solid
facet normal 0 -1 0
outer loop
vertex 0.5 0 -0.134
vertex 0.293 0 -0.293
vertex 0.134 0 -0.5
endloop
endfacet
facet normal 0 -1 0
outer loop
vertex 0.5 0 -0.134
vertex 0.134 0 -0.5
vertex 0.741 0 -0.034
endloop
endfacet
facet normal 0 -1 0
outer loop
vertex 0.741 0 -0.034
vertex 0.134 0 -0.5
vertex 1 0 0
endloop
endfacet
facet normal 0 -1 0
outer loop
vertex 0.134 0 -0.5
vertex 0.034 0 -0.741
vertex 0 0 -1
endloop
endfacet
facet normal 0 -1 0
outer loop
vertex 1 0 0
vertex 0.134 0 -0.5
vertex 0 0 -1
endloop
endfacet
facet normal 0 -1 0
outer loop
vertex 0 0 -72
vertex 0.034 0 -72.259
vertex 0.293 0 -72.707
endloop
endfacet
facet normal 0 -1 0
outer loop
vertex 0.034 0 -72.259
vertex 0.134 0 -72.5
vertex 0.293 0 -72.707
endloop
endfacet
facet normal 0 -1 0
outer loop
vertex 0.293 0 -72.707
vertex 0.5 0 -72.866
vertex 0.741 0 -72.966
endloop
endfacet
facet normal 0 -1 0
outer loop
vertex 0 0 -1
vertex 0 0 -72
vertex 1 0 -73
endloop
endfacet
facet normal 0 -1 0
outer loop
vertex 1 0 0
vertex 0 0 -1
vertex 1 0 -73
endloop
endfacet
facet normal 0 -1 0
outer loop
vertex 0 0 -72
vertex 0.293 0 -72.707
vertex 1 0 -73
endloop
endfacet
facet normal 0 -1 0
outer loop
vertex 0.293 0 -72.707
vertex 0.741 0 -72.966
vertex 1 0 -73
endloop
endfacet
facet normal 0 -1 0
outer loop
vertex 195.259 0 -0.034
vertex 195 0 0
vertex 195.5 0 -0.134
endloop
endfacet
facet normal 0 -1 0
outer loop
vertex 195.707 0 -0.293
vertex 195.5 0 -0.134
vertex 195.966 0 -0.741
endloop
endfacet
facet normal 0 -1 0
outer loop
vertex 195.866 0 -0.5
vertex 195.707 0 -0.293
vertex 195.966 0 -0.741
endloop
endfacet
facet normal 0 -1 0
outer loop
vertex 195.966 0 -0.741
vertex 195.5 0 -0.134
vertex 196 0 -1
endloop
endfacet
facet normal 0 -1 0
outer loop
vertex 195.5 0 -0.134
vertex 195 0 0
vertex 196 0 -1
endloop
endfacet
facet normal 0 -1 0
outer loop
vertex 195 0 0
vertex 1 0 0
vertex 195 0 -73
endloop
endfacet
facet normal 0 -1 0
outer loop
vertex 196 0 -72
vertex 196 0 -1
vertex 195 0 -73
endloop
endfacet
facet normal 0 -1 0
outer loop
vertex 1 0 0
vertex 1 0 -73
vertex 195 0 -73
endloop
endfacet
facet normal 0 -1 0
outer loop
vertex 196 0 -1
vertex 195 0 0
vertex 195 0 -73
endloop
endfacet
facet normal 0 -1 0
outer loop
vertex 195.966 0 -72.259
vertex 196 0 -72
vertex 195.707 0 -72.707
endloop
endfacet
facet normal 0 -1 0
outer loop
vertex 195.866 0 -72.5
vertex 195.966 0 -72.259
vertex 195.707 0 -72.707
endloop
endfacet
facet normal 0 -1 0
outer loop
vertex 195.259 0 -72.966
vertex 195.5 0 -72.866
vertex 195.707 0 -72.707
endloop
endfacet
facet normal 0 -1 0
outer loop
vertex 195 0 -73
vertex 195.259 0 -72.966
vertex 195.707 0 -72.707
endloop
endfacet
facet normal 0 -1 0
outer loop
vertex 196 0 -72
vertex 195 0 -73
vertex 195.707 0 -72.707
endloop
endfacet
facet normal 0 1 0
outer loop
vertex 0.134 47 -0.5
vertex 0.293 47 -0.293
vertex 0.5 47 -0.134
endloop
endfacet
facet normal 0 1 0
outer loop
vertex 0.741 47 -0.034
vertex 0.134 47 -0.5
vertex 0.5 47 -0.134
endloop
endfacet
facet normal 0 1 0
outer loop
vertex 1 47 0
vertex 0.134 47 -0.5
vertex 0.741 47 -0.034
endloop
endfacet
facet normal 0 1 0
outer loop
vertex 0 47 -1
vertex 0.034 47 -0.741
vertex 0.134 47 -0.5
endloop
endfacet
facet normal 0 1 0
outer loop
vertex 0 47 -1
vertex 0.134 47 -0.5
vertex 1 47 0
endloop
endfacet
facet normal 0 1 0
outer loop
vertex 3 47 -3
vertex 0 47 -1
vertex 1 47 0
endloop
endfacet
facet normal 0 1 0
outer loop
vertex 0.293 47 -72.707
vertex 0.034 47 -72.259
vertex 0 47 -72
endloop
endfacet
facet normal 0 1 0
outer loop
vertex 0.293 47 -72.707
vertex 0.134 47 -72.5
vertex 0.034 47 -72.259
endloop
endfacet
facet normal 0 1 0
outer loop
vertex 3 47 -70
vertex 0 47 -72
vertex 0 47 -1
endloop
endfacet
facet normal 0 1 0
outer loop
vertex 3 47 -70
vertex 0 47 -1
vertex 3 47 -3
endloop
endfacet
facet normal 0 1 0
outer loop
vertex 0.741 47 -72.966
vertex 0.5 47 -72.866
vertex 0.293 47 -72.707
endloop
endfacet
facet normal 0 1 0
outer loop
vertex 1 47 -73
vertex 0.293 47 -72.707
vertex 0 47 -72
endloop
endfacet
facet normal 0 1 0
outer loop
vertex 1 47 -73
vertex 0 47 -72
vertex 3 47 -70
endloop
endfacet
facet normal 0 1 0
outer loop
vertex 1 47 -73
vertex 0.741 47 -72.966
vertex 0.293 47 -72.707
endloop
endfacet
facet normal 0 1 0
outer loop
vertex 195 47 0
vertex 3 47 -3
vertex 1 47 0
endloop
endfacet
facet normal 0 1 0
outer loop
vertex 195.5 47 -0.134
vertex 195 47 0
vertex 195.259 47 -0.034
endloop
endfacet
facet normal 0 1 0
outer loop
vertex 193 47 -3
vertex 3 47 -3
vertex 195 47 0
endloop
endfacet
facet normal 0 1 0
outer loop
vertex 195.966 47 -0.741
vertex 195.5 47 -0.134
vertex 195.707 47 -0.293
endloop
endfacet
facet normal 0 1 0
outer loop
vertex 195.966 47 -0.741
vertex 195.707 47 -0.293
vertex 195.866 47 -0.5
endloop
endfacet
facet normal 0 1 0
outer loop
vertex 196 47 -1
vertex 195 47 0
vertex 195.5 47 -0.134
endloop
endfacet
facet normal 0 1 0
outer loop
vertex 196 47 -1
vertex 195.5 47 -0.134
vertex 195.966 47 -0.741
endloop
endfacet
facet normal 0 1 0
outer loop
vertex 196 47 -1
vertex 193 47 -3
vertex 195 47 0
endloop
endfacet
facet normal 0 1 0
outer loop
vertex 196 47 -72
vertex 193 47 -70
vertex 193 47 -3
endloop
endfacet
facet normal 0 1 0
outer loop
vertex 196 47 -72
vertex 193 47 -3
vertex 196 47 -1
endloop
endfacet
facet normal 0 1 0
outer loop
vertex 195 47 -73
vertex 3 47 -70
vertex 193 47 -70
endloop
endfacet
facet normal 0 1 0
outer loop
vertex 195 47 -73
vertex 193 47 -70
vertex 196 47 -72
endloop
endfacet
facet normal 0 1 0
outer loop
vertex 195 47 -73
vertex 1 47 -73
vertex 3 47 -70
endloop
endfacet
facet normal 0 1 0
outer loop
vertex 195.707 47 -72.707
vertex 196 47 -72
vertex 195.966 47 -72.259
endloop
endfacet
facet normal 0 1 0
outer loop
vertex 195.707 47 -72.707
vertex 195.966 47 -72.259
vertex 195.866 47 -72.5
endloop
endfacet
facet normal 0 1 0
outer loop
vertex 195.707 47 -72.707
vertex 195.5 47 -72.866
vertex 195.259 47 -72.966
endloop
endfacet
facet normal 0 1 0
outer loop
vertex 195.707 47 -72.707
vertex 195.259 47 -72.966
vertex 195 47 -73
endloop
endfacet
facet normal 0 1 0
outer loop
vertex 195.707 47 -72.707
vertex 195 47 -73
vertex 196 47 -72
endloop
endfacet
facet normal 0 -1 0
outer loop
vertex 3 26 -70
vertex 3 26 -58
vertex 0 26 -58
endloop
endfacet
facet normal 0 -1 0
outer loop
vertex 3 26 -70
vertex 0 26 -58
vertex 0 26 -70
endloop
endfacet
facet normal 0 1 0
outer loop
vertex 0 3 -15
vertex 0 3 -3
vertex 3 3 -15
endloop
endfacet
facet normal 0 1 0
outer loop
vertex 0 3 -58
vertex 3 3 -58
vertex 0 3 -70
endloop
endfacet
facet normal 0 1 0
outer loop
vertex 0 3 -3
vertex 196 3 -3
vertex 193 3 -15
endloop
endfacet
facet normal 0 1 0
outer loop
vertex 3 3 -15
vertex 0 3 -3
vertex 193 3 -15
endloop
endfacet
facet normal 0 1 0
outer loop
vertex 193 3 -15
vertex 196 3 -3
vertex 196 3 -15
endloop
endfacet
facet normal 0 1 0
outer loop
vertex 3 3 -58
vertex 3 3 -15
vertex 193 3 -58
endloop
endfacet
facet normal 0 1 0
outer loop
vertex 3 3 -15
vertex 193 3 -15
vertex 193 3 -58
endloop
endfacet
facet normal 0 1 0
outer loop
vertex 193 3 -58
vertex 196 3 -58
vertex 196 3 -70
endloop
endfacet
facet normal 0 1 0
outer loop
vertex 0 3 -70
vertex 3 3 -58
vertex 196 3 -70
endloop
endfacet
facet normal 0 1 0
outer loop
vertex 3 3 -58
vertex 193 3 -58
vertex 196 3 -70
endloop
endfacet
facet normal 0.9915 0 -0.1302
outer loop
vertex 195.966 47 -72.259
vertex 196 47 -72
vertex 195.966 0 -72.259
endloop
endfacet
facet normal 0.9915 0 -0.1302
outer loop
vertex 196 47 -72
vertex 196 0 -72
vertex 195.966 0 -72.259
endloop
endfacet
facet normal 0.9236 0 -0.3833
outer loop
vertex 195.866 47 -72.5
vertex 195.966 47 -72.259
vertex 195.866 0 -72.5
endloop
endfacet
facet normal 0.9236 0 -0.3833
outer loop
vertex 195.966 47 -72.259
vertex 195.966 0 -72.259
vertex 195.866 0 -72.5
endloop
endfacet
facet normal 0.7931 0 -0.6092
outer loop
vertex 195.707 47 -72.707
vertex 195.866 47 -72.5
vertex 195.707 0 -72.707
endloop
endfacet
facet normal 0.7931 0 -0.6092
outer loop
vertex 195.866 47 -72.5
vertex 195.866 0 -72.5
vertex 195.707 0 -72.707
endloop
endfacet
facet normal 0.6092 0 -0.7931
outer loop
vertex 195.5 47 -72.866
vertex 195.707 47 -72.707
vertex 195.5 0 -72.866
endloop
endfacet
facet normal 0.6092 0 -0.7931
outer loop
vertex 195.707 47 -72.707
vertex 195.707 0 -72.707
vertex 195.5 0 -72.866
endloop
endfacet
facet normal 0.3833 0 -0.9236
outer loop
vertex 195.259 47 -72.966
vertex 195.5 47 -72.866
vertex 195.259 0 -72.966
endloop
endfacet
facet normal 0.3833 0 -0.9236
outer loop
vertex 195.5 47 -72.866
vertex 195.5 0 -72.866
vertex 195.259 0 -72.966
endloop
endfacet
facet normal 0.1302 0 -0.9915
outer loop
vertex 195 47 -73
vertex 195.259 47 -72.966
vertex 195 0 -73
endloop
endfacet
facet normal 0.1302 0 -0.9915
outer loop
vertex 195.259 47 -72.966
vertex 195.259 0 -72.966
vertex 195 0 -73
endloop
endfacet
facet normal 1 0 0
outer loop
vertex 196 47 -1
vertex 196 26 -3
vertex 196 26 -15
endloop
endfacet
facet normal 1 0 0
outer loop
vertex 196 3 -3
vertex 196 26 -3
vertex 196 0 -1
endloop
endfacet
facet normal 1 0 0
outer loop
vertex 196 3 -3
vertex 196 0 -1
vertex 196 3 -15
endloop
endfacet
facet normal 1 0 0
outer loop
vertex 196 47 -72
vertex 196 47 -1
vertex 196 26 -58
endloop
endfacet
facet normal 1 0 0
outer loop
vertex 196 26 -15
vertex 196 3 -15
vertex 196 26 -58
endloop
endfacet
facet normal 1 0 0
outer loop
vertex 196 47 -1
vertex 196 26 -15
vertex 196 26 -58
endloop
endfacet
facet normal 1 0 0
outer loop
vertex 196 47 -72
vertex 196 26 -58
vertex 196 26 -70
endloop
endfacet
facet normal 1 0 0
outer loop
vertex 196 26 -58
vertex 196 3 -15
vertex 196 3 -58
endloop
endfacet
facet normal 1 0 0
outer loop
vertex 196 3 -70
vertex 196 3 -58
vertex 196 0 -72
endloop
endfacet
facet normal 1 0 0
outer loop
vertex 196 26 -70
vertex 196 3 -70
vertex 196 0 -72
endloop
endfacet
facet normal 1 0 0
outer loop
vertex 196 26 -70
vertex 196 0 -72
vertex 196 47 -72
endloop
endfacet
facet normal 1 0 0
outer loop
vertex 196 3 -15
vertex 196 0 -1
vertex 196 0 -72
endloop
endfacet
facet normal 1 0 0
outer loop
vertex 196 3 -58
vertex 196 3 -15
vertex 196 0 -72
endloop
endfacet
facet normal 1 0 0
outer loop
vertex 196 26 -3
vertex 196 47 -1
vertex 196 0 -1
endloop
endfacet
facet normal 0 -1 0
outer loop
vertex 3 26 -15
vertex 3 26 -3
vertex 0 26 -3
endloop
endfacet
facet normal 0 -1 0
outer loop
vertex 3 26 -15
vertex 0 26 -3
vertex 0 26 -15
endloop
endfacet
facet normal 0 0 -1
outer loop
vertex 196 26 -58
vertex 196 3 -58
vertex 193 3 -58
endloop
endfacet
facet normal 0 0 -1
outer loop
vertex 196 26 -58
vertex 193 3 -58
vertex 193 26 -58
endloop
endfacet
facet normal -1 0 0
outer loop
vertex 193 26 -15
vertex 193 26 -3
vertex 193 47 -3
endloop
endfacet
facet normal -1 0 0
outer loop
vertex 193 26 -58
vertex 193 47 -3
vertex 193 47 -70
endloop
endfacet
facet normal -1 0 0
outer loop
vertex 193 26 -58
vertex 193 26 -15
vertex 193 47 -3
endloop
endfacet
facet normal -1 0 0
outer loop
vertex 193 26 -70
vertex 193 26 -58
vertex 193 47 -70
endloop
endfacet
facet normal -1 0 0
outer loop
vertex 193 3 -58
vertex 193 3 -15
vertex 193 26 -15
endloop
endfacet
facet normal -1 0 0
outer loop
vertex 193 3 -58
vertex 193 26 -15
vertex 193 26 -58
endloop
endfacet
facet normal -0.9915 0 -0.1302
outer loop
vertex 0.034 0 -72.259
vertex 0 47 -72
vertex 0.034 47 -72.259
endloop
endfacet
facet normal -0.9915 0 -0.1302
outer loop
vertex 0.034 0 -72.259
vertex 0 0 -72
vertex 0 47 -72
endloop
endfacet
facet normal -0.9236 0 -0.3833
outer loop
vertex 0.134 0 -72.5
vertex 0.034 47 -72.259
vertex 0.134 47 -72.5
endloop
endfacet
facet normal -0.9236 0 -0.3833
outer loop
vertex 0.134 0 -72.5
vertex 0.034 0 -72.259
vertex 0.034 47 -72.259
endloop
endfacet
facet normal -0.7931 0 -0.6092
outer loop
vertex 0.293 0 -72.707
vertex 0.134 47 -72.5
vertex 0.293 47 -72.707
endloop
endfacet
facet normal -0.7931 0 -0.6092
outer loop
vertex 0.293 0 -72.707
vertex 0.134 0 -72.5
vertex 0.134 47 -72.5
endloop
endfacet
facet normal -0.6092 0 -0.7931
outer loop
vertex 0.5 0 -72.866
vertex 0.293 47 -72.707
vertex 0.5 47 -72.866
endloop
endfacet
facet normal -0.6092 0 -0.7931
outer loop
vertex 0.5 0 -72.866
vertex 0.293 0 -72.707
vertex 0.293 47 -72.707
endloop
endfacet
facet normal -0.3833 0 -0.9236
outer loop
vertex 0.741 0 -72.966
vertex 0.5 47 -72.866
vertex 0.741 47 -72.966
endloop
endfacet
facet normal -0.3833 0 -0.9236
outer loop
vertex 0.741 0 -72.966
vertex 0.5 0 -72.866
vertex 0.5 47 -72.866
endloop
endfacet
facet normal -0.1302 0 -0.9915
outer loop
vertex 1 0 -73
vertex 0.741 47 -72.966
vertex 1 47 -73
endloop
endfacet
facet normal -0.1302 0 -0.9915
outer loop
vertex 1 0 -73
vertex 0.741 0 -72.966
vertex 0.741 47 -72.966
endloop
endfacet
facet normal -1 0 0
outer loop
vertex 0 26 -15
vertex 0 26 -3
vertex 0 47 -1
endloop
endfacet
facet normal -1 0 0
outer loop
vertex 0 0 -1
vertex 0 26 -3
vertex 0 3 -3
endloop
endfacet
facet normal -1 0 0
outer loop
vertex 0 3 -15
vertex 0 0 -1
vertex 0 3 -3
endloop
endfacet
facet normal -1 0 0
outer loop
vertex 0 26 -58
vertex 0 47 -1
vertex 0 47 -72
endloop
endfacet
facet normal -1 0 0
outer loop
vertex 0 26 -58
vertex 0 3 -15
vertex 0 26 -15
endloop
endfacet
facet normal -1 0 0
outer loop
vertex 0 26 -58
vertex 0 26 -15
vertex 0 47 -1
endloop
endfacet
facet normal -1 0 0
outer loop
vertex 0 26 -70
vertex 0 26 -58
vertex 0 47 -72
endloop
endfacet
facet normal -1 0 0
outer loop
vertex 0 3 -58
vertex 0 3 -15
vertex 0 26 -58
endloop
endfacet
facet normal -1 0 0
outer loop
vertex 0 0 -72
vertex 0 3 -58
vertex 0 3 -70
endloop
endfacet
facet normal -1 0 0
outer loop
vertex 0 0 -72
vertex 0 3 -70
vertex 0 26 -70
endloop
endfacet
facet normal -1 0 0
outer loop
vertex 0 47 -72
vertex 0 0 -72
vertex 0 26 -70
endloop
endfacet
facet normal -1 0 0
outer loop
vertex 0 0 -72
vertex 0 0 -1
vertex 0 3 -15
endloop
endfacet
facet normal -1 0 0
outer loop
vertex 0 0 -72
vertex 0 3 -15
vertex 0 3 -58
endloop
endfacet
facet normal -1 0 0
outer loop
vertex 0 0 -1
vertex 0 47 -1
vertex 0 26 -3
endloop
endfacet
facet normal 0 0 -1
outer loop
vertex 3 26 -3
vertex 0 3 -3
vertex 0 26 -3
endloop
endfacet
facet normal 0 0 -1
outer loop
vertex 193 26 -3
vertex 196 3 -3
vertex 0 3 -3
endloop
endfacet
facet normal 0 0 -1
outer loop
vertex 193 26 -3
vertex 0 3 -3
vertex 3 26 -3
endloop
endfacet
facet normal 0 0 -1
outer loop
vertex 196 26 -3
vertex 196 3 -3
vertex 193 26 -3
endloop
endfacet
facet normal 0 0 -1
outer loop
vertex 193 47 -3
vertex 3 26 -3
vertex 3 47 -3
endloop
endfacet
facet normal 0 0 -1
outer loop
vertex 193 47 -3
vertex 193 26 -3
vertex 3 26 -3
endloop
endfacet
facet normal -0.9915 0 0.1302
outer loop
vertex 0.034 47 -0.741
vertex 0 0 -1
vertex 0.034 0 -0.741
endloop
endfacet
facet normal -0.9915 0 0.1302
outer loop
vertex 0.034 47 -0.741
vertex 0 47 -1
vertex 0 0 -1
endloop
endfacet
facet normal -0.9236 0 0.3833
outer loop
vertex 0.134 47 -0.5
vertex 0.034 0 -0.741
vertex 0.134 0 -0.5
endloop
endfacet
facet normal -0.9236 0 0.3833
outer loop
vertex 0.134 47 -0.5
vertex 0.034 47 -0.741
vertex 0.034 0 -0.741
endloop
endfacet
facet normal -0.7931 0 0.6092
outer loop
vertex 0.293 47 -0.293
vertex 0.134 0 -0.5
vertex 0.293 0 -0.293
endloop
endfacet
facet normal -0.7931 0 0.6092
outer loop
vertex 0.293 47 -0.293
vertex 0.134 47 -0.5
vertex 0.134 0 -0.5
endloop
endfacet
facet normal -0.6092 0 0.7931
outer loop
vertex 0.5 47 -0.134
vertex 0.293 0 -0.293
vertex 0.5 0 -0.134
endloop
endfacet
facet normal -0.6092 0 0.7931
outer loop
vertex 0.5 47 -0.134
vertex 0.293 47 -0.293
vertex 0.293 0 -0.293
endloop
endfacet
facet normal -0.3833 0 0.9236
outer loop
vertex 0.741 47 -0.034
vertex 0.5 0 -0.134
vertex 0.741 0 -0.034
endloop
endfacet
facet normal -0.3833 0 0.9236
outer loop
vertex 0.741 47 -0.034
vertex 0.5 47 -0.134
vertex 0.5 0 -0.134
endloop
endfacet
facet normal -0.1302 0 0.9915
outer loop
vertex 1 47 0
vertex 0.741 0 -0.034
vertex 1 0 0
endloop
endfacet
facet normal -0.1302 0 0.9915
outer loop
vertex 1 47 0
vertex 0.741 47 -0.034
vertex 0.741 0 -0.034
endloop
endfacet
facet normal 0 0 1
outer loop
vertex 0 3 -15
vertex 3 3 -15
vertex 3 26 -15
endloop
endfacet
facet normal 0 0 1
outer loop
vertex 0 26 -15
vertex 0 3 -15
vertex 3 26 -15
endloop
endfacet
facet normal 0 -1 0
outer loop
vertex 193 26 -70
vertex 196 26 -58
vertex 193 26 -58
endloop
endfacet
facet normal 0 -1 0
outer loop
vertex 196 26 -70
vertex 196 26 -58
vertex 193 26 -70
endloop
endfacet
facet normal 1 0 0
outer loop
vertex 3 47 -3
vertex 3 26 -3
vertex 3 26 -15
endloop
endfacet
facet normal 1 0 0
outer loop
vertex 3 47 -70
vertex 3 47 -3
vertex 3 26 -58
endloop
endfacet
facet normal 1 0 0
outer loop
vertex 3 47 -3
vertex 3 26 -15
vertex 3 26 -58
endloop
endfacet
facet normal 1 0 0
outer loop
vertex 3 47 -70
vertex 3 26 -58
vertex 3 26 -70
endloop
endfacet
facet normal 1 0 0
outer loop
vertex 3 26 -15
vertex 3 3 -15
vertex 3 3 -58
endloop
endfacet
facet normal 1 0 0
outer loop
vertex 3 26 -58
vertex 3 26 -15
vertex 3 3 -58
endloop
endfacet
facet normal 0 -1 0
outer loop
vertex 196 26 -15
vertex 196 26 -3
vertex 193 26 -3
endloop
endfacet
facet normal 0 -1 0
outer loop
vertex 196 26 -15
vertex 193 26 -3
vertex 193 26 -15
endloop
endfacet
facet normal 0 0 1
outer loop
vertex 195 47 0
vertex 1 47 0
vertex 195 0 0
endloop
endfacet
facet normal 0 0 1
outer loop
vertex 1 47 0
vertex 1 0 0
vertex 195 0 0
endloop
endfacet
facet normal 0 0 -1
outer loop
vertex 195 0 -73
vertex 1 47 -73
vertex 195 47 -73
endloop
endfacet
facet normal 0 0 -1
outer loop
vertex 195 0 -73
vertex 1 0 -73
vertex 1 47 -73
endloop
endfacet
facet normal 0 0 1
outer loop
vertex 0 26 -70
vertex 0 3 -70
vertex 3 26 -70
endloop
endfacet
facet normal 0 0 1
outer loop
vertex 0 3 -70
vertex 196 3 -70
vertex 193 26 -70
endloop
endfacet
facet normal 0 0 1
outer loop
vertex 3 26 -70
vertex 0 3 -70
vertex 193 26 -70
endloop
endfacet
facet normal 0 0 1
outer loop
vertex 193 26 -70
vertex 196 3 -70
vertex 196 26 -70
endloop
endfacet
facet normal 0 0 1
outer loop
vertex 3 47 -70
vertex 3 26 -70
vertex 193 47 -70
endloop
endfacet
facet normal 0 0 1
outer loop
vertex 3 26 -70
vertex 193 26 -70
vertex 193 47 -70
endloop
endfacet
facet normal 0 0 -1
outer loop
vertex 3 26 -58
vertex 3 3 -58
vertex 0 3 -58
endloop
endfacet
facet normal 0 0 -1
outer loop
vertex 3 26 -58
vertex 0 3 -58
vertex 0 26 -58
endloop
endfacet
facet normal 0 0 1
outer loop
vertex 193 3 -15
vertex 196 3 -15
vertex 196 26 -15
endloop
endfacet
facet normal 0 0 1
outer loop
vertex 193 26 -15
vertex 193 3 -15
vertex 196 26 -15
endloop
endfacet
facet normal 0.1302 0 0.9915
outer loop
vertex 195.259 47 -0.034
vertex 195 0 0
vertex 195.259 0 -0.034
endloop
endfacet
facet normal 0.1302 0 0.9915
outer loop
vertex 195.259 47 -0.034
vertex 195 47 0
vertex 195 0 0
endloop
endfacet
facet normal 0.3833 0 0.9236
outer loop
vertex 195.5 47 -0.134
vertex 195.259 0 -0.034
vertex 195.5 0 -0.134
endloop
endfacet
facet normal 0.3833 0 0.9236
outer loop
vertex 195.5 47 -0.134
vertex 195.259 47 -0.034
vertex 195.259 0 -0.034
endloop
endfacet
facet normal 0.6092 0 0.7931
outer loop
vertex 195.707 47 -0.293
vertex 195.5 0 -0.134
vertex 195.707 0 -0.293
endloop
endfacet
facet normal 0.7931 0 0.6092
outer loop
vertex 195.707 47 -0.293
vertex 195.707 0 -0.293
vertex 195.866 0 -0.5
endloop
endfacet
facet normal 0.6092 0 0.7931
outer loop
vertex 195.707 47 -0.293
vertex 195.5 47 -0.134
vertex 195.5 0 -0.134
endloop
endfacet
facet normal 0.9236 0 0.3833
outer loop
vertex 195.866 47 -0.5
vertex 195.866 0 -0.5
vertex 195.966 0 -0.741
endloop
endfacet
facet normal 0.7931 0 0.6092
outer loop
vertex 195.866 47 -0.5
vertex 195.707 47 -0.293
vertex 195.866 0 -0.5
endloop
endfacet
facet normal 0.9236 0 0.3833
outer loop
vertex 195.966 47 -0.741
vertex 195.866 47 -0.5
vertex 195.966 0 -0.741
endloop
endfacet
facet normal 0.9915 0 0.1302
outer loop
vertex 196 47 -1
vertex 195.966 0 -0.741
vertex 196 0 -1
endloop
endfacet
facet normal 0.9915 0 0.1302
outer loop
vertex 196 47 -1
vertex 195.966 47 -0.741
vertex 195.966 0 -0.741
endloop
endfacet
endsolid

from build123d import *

# Parameters (mm, degrees)
SKETCH1_W           = 196
SKETCH1_H           = 73
BOSS_EXTRUDE1_DEPTH = 3
SKETCH3_W           = 196
SKETCH3_H           = 73
SKETCH3_W_2         = 190
SKETCH3_H_2         = 67
BOSS_EXTRUDE2_DEPTH = 44
FILLET1_R           = 1
SKETCH4_W           = 12
SKETCH4_H           = 23
CUT_EXTRUDE1_DEPTH  = 197


with BuildPart() as part:
    # Sketch1 → Boss-Extrude1 (new body)
    with BuildSketch(Plane(origin=(0, 0, 0), x_dir=(1, 0, 0), z_dir=(0, 1, 0))):
        with Locations((98, 36.5)):
            Rectangle(SKETCH1_W, SKETCH1_H)
    extrude(amount=BOSS_EXTRUDE1_DEPTH)

    # Sketch3 → Boss-Extrude2 (add)
    with BuildSketch(Plane(origin=(0, 3, 0), x_dir=(1, 0, 0), z_dir=(0, 1, 0))):
        with Locations((98, 36.5)):
            Rectangle(SKETCH3_W, SKETCH3_H)
        with Locations((98, 36.5)):
            Rectangle(SKETCH3_W_2, SKETCH3_H_2, mode=Mode.SUBTRACT)
    extrude(amount=BOSS_EXTRUDE2_DEPTH)

    # Fillet1
    fillet1_edges = [part.edges().sort_by_distance(p)[0] for p in [
        (0, 23.5, -73),
        (196, 23.5, -73),
        (196, 23.5, 0),
        (0, 23.5, 0),
    ]]
    fillet(fillet1_edges, radius=FILLET1_R)

    # Sketch4 → Cut-Extrude1 (cut, through all)
    with BuildSketch(Plane(origin=(196, 0, 0), x_dir=(0, 0, -1), z_dir=(1, 0, 0))):
        with Locations((9, 14.5)):
            Rectangle(SKETCH4_W, SKETCH4_H)
        with Locations((64, 14.5)):
            Rectangle(SKETCH4_W, SKETCH4_H)
    extrude(amount=-CUT_EXTRUDE1_DEPTH, mode=Mode.SUBTRACT)


solid = part.part
